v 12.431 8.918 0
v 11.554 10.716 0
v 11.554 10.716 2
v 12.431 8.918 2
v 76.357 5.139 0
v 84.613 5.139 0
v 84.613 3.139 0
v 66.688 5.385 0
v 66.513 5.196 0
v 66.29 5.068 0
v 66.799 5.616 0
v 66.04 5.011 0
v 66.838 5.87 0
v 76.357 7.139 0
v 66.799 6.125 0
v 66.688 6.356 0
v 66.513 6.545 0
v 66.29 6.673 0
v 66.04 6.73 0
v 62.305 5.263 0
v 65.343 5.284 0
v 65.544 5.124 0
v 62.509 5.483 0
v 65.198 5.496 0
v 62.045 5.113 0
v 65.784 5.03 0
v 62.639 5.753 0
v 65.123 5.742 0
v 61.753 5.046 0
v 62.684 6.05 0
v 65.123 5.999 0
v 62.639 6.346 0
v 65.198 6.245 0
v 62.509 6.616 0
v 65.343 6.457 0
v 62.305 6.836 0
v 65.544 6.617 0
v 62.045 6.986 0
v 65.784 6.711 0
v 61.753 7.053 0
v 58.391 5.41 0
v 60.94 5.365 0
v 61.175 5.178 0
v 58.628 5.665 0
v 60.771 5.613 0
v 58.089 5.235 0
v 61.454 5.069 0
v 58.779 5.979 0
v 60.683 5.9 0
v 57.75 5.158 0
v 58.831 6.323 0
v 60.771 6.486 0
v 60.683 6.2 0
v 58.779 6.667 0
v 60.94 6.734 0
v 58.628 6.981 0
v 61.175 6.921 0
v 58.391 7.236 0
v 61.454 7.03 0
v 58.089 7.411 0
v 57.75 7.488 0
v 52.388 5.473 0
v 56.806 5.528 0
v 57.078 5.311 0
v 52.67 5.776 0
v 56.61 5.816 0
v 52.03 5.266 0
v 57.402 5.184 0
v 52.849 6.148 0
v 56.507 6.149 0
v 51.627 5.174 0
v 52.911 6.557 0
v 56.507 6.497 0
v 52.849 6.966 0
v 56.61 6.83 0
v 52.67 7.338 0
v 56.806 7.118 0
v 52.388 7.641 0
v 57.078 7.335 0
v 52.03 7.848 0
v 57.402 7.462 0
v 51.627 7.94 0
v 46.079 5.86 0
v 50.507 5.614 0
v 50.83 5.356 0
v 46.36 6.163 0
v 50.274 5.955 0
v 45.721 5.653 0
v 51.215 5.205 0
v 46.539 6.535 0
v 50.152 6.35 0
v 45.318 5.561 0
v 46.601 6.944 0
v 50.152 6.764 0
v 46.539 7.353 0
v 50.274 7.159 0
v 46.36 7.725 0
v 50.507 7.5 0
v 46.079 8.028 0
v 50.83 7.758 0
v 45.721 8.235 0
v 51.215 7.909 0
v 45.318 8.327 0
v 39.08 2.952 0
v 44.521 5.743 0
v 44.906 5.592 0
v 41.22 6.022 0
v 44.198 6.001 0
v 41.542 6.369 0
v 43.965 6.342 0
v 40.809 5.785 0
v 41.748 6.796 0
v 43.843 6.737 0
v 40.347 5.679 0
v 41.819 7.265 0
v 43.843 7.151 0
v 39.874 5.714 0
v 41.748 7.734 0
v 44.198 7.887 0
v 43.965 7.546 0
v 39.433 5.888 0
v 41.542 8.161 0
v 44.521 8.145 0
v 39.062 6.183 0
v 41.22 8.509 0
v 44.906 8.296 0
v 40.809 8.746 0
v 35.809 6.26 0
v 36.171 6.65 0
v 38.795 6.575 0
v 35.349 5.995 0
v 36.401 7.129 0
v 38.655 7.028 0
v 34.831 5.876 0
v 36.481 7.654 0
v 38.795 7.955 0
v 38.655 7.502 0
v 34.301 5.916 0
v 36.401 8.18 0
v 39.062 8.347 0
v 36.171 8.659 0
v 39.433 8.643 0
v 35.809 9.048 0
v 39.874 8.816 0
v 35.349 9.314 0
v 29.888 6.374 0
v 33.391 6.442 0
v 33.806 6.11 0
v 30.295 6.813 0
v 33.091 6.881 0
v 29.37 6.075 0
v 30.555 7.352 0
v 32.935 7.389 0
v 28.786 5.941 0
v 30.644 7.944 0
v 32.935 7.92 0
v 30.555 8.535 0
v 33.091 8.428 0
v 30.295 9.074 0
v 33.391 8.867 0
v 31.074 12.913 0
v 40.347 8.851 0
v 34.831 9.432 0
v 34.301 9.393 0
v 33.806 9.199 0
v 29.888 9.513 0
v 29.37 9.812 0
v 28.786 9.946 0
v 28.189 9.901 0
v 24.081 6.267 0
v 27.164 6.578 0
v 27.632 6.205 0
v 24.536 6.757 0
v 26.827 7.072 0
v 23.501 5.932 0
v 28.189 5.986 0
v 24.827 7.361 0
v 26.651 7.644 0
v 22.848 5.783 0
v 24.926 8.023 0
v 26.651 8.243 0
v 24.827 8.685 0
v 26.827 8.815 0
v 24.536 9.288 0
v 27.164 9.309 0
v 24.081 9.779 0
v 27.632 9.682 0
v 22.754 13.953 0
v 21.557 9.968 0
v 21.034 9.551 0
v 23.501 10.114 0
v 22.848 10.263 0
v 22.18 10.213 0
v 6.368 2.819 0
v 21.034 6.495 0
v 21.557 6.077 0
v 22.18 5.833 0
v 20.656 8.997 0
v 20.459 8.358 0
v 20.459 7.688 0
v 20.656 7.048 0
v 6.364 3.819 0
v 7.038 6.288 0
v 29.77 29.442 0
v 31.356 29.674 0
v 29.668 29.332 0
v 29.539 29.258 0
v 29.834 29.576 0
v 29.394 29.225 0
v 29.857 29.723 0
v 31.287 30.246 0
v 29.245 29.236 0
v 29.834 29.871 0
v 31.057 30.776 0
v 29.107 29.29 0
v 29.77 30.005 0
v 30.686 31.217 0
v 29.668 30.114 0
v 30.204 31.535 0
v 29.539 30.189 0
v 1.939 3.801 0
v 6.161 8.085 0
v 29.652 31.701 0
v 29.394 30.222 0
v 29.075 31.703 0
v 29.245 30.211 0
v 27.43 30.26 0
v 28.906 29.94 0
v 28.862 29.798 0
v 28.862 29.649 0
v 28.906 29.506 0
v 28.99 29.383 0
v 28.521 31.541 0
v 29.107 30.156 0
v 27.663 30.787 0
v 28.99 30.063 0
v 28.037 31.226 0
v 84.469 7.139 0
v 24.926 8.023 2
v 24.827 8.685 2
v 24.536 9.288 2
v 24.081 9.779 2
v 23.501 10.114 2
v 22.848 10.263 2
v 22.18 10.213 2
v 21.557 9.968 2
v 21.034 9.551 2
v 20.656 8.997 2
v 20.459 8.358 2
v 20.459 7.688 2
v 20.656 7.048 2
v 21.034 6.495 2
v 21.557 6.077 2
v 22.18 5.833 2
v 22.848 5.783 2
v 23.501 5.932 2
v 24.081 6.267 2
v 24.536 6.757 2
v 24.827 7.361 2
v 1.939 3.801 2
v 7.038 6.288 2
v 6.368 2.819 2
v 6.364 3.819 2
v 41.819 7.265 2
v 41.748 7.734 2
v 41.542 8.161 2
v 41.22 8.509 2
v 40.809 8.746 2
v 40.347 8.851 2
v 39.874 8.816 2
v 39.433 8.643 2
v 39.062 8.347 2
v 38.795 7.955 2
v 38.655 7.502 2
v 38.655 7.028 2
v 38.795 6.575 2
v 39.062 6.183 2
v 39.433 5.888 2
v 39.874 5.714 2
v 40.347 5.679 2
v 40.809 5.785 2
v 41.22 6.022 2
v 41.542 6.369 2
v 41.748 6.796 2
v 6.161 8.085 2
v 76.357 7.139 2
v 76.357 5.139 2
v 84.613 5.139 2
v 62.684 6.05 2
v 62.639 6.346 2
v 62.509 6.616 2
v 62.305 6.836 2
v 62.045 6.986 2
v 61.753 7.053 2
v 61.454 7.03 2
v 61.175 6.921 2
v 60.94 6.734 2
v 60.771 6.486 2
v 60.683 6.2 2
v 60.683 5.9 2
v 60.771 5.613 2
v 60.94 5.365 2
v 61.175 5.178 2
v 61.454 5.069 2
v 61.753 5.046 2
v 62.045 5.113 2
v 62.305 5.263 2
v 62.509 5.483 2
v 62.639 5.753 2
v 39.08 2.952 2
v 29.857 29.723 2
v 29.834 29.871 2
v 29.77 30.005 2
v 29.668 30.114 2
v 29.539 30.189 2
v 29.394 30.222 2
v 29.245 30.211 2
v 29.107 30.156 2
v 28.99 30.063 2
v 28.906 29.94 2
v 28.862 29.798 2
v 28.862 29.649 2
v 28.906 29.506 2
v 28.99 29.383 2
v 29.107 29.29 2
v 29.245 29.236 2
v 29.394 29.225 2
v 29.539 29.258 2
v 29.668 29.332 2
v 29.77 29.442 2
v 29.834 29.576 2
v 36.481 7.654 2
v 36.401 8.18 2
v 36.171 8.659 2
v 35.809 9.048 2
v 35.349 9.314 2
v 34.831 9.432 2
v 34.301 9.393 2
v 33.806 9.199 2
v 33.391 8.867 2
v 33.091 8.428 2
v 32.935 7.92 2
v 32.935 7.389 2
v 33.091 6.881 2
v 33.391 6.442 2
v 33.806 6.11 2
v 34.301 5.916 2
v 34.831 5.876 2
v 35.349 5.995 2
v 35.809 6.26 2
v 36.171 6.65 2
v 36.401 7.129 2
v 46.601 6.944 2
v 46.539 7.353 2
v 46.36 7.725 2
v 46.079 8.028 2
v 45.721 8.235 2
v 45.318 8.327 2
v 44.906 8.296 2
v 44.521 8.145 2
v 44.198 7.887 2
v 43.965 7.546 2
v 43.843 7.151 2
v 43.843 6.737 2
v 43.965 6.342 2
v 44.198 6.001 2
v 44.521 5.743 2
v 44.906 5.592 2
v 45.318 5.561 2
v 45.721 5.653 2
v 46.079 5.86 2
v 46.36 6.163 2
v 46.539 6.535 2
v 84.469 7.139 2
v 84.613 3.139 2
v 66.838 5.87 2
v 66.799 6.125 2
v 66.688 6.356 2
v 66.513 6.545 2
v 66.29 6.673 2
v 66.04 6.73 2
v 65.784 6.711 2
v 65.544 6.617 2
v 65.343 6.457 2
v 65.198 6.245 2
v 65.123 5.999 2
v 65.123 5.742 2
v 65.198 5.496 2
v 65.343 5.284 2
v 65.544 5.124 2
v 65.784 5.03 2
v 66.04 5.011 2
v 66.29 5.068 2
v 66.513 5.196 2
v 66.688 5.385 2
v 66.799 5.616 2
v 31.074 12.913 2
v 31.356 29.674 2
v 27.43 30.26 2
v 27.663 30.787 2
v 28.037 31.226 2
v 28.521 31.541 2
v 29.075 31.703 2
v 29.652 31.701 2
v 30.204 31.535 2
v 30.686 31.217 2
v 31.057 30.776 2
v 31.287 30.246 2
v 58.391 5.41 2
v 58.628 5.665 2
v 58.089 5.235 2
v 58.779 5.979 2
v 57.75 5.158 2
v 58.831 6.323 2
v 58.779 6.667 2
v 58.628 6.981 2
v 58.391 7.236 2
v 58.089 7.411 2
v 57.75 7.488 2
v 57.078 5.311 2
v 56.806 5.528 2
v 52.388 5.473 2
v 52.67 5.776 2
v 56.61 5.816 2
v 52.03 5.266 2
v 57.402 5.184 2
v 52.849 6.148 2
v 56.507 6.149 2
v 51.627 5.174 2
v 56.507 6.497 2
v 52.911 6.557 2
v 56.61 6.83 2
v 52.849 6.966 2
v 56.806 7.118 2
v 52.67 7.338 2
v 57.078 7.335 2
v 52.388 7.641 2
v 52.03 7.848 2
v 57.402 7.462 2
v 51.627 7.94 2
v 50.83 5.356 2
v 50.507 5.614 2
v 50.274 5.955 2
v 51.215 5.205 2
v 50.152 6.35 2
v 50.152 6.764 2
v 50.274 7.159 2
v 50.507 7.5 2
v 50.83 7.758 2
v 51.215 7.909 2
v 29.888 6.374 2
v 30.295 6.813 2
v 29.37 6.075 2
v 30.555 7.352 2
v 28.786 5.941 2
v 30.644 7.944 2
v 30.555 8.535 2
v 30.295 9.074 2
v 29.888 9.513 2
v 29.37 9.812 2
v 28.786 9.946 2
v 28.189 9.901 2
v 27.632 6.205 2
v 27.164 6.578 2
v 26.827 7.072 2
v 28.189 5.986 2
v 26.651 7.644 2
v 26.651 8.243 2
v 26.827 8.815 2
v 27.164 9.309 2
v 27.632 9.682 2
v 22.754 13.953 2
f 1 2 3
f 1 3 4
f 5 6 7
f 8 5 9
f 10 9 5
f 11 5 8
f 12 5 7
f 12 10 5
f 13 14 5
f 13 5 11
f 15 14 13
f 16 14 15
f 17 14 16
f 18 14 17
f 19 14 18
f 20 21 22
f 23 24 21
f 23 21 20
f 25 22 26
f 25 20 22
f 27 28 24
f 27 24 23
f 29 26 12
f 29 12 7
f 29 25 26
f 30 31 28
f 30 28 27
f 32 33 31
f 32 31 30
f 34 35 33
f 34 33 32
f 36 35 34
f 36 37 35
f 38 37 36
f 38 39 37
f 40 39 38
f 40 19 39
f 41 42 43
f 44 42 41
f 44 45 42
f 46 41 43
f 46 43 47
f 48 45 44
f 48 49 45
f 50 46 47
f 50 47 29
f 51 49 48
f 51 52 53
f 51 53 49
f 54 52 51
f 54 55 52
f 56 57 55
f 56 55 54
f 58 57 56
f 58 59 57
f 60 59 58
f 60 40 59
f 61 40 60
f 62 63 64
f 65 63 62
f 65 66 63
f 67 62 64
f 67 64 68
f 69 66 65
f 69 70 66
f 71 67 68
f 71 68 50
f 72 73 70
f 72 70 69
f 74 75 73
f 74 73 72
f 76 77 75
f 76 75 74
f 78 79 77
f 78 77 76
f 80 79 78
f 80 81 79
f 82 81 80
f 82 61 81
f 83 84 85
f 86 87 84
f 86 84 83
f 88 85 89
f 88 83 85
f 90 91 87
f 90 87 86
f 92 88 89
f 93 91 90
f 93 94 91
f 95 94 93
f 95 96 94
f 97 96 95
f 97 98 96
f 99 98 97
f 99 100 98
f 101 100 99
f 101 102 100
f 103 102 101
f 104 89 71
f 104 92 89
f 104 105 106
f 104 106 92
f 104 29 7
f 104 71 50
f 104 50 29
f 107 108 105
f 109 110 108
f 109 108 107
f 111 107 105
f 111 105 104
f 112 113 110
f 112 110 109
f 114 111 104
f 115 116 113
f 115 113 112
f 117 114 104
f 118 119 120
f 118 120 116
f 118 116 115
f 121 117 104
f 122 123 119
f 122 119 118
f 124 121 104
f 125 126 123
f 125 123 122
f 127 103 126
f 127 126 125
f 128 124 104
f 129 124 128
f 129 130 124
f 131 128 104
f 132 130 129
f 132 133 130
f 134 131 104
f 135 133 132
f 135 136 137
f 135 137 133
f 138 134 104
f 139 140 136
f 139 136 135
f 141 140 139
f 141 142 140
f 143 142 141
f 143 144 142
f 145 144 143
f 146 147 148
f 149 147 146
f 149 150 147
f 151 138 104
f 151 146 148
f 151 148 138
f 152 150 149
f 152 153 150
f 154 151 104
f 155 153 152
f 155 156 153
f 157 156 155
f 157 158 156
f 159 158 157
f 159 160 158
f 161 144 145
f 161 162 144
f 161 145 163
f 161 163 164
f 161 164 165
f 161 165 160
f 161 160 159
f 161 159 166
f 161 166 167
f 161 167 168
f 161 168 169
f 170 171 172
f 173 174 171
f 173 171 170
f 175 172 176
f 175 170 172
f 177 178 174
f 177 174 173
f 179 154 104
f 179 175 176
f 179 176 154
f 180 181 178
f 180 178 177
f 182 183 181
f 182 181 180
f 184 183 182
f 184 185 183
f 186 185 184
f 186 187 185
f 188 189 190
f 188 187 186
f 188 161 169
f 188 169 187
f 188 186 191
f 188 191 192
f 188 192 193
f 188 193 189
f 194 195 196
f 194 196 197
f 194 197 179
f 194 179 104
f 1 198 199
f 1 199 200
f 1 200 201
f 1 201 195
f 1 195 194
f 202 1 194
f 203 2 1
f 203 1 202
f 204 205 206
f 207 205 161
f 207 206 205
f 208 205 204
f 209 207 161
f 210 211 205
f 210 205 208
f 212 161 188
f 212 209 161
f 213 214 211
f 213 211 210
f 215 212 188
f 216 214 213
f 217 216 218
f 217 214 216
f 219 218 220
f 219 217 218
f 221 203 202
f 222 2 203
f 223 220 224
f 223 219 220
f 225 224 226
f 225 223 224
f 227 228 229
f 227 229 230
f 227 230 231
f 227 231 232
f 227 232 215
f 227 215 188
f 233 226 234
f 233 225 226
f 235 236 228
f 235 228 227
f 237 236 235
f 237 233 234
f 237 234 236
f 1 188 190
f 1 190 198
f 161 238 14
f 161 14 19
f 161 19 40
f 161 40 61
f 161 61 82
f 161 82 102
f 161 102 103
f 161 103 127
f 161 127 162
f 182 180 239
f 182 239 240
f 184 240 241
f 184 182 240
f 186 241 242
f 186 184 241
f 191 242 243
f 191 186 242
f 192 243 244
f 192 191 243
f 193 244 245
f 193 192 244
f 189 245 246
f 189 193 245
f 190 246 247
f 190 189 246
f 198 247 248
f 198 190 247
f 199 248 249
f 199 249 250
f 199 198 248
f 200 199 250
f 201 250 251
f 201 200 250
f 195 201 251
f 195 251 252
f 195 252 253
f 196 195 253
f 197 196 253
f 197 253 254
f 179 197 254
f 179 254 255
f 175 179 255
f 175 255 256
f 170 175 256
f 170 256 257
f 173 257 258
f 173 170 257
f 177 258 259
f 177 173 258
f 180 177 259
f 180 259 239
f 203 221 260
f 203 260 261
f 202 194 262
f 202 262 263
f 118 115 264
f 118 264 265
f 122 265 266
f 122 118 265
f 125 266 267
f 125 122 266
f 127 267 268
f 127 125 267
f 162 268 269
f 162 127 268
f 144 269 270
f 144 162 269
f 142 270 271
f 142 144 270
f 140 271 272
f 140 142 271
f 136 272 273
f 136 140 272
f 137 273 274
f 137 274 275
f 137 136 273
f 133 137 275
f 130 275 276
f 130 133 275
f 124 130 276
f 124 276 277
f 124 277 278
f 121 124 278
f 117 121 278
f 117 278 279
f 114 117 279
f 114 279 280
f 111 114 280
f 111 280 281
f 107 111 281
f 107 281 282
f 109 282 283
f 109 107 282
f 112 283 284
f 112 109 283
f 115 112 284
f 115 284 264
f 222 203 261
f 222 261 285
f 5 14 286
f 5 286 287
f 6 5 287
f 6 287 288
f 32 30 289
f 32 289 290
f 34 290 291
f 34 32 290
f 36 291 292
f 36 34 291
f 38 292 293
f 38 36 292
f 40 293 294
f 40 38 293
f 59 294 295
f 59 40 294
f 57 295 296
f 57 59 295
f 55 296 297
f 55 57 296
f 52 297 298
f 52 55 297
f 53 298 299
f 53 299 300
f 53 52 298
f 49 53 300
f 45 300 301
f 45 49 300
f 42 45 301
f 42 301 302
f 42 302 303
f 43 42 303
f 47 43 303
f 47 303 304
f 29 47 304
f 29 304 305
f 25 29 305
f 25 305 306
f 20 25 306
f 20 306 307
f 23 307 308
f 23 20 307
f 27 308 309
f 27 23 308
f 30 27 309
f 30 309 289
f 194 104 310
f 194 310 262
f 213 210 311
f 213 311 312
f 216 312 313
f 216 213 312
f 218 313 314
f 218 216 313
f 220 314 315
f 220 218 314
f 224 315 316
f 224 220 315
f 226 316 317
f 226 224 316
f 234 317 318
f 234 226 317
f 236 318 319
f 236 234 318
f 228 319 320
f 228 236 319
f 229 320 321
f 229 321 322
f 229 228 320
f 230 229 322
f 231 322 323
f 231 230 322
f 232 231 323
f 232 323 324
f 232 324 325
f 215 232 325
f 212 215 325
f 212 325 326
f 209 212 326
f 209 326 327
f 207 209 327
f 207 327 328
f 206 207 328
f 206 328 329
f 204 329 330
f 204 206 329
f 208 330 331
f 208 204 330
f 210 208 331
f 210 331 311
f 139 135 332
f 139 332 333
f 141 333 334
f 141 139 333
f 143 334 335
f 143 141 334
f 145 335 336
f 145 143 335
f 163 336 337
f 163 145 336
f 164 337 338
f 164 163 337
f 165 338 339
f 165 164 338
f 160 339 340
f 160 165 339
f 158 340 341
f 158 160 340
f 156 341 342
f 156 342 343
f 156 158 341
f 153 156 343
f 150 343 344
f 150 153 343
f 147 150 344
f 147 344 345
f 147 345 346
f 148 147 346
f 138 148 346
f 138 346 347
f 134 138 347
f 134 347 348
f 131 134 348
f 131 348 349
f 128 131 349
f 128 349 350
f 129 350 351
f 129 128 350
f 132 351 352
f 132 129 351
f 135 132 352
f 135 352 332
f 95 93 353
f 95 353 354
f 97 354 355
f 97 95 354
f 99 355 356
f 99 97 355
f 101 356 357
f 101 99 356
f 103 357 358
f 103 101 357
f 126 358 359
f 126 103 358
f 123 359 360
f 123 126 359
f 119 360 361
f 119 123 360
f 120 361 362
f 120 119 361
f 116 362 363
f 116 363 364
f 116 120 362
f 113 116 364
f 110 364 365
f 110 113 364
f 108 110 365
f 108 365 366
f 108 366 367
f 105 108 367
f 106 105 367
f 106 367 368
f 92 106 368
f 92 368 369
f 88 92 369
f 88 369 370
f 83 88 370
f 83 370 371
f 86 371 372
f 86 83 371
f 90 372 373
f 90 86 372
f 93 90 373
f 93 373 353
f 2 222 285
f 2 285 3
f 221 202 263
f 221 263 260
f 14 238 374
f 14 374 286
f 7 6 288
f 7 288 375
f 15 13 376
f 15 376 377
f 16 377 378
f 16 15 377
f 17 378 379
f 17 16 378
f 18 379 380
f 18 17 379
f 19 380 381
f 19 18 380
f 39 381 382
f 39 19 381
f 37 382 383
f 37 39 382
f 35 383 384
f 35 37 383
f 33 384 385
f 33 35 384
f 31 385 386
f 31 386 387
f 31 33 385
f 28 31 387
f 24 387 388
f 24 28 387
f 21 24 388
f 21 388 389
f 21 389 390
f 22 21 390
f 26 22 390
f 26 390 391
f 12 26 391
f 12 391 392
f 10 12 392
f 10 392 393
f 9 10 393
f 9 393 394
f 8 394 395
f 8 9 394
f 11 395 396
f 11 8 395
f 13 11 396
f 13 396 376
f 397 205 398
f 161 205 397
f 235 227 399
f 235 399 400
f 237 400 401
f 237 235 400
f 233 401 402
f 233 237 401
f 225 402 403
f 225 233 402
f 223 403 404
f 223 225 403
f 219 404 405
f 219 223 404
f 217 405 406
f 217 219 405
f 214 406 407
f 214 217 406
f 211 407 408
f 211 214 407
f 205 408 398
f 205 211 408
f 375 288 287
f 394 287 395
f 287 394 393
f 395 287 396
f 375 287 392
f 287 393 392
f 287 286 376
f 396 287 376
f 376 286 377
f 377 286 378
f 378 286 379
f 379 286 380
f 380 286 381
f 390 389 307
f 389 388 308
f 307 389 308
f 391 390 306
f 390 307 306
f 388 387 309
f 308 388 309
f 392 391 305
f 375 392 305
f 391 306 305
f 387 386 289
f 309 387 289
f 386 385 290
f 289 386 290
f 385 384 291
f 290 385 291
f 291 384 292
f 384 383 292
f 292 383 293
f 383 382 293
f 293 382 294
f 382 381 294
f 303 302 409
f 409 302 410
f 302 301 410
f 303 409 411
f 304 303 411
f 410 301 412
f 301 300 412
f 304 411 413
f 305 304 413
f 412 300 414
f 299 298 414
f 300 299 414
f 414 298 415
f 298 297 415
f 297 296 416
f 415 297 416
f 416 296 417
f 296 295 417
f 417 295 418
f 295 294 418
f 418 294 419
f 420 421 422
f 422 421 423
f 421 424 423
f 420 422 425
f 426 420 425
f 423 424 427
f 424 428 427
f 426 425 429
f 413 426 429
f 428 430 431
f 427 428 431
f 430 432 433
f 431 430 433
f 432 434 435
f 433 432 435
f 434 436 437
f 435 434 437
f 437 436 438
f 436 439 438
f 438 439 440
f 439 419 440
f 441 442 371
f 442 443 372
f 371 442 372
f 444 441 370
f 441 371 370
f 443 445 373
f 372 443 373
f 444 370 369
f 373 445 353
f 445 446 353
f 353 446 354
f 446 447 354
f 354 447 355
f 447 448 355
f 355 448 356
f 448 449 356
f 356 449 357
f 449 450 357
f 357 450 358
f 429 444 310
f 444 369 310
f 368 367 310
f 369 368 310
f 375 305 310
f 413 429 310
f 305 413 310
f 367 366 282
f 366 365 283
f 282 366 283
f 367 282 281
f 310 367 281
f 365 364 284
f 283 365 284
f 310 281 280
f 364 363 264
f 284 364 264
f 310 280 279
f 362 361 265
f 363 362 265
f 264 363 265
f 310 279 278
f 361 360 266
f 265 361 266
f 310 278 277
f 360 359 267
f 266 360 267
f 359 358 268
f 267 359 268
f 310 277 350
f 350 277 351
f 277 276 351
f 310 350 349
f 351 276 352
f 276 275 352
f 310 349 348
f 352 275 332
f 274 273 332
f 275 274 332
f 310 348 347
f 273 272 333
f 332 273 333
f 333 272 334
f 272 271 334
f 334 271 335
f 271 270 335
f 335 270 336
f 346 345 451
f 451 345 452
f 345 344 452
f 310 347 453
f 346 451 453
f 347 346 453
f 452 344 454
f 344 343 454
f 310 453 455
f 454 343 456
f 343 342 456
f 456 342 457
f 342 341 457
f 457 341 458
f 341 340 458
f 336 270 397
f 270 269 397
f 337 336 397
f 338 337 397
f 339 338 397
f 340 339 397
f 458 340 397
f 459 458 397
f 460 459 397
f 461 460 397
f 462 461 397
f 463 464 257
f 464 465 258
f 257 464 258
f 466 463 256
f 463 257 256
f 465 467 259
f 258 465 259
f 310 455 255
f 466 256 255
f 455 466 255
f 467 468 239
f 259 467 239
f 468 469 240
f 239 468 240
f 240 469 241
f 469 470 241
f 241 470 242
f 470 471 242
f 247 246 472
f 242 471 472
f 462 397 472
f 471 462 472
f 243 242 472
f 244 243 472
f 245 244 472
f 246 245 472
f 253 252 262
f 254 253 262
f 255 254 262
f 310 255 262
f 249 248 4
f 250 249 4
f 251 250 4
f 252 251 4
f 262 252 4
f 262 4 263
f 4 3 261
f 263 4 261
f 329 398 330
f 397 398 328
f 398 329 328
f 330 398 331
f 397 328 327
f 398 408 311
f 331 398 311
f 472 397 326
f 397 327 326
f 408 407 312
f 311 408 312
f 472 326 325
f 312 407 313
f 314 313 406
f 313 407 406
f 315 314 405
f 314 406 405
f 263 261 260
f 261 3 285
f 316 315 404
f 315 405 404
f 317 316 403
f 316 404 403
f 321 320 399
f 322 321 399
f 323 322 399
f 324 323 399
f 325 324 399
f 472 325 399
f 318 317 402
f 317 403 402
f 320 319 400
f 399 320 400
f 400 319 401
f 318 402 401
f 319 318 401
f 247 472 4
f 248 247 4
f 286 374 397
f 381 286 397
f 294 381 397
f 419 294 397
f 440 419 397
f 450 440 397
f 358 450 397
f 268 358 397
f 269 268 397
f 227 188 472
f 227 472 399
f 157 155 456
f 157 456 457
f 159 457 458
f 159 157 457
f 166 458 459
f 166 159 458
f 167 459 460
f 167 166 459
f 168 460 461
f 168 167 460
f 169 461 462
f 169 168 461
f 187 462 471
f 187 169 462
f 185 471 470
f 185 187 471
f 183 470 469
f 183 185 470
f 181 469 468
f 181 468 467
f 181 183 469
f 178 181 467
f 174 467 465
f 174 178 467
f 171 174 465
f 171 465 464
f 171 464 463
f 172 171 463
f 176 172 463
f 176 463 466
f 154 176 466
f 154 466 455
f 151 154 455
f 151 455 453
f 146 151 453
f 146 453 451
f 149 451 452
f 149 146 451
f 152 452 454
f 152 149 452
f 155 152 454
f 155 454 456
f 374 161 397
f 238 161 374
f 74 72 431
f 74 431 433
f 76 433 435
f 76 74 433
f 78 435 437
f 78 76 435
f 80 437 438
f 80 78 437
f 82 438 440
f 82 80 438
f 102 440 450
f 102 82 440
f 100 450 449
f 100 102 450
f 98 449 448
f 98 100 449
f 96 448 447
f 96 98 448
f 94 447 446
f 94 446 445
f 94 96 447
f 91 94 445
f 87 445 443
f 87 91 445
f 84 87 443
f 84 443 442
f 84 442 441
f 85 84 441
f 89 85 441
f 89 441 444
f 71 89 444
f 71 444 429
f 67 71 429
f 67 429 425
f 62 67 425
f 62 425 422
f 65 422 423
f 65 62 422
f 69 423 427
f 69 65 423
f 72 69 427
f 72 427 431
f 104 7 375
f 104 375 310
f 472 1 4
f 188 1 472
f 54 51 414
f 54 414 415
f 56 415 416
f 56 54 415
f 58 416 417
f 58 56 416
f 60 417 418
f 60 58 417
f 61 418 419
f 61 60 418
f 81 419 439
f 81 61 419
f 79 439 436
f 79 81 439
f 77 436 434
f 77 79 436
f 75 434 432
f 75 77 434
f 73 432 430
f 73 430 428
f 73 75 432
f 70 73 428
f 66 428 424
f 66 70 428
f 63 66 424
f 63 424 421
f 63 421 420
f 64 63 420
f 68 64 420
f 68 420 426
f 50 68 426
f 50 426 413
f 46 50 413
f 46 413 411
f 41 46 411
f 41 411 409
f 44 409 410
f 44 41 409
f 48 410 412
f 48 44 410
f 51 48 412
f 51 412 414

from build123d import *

# Parameters (mm, degrees)
MODEL_R         = 0.5
MODEL_R_2       = 1.782992023
MODEL_R_3       = 1.590607237
MODEL_R_4       = 1.168321926
MODEL_R_5       = 1.005990221
MODEL_R_6       = 0.862372678
MODEL_R_7       = 1.386768465
MODEL_R_8       = 2.007691982
MODEL_R_9       = 2.246211192
EXTRUDE_1_DEPTH = 2


with BuildPart() as part:
    # Model → 凸台-拉伸1 (new body)
    with BuildSketch(Plane.XY):
        with BuildLine():
            Line((7.038065488, 6.287794997), (6.161323194, 8.085383089))
            Line((6.161323194, 8.085383089), (11.554087472, 10.71560997))
            Line((11.554087472, 10.71560997), (12.430829766, 8.918021877))
            Line((12.430829766, 8.918021877), (22.753800963, 13.952871341))
            Line((22.753800963, 13.952871341), (27.429909526, 30.259640434))
            ThreePointArc((27.429909526, 30.259640434), (29.651920806, 31.70137695), (31.356032886, 29.673584966))
            Line((31.356032886, 29.673584966), (31.073854544, 12.913284736))
            Line((31.073854544, 12.913284736), (84.46937713, 7.138642034))
            Line((84.46937713, 7.138642034), (76.356996628, 7.138642034))
            Line((76.356996628, 7.138642034), (76.356996628, 5.138642034))
            Line((76.356996628, 5.138642034), (84.613173024, 5.138642034))
            Line((84.613173024, 5.138642034), (84.613173024, 3.138642034))
            Line((84.613173024, 3.138642034), (39.080128632, 2.952174352))
            Line((39.080128632, 2.952174352), (6.368039675, 2.818983184))
            Line((6.368039675, 2.818983184), (6.36396809, 3.818974895))
            Line((6.36396809, 3.818974895), (1.939296742, 3.800959318))
            Line((1.939296742, 3.800959318), (7.038065488, 6.287794997))
        make_face()
        with Locations((29.356650707, 29.723293138)):
            Circle(MODEL_R, mode=Mode.SUBTRACT)
        with Locations((34.697579439, 7.654463755)):
            Circle(MODEL_R_2, mode=Mode.SUBTRACT)
        with Locations((40.228196013, 7.265180246)):
            Circle(MODEL_R_3, mode=Mode.SUBTRACT)
        with Locations((57.662403713, 6.323039134)):
            Circle(MODEL_R_4, mode=Mode.SUBTRACT)
        with Locations((61.677618383, 6.049673892)):
            Circle(MODEL_R_5, mode=Mode.SUBTRACT)
        with Locations((65.97541766, 5.870473213)):
            Circle(MODEL_R_6, mode=Mode.SUBTRACT)
        with Locations((45.214294389, 6.944127982)):
            Circle(MODEL_R_7, mode=Mode.SUBTRACT)
        with Locations((28.636152213, 7.943525557)):
            Circle(MODEL_R_8, mode=Mode.SUBTRACT)
        with Locations((22.680090468, 8.022724278)):
            Circle(MODEL_R_9, mode=Mode.SUBTRACT)
        with Locations((51.523752732, 6.556908357)):
            Circle(MODEL_R_7, mode=Mode.SUBTRACT)
    extrude(amount=EXTRUDE_1_DEPTH)


solid = part.part
